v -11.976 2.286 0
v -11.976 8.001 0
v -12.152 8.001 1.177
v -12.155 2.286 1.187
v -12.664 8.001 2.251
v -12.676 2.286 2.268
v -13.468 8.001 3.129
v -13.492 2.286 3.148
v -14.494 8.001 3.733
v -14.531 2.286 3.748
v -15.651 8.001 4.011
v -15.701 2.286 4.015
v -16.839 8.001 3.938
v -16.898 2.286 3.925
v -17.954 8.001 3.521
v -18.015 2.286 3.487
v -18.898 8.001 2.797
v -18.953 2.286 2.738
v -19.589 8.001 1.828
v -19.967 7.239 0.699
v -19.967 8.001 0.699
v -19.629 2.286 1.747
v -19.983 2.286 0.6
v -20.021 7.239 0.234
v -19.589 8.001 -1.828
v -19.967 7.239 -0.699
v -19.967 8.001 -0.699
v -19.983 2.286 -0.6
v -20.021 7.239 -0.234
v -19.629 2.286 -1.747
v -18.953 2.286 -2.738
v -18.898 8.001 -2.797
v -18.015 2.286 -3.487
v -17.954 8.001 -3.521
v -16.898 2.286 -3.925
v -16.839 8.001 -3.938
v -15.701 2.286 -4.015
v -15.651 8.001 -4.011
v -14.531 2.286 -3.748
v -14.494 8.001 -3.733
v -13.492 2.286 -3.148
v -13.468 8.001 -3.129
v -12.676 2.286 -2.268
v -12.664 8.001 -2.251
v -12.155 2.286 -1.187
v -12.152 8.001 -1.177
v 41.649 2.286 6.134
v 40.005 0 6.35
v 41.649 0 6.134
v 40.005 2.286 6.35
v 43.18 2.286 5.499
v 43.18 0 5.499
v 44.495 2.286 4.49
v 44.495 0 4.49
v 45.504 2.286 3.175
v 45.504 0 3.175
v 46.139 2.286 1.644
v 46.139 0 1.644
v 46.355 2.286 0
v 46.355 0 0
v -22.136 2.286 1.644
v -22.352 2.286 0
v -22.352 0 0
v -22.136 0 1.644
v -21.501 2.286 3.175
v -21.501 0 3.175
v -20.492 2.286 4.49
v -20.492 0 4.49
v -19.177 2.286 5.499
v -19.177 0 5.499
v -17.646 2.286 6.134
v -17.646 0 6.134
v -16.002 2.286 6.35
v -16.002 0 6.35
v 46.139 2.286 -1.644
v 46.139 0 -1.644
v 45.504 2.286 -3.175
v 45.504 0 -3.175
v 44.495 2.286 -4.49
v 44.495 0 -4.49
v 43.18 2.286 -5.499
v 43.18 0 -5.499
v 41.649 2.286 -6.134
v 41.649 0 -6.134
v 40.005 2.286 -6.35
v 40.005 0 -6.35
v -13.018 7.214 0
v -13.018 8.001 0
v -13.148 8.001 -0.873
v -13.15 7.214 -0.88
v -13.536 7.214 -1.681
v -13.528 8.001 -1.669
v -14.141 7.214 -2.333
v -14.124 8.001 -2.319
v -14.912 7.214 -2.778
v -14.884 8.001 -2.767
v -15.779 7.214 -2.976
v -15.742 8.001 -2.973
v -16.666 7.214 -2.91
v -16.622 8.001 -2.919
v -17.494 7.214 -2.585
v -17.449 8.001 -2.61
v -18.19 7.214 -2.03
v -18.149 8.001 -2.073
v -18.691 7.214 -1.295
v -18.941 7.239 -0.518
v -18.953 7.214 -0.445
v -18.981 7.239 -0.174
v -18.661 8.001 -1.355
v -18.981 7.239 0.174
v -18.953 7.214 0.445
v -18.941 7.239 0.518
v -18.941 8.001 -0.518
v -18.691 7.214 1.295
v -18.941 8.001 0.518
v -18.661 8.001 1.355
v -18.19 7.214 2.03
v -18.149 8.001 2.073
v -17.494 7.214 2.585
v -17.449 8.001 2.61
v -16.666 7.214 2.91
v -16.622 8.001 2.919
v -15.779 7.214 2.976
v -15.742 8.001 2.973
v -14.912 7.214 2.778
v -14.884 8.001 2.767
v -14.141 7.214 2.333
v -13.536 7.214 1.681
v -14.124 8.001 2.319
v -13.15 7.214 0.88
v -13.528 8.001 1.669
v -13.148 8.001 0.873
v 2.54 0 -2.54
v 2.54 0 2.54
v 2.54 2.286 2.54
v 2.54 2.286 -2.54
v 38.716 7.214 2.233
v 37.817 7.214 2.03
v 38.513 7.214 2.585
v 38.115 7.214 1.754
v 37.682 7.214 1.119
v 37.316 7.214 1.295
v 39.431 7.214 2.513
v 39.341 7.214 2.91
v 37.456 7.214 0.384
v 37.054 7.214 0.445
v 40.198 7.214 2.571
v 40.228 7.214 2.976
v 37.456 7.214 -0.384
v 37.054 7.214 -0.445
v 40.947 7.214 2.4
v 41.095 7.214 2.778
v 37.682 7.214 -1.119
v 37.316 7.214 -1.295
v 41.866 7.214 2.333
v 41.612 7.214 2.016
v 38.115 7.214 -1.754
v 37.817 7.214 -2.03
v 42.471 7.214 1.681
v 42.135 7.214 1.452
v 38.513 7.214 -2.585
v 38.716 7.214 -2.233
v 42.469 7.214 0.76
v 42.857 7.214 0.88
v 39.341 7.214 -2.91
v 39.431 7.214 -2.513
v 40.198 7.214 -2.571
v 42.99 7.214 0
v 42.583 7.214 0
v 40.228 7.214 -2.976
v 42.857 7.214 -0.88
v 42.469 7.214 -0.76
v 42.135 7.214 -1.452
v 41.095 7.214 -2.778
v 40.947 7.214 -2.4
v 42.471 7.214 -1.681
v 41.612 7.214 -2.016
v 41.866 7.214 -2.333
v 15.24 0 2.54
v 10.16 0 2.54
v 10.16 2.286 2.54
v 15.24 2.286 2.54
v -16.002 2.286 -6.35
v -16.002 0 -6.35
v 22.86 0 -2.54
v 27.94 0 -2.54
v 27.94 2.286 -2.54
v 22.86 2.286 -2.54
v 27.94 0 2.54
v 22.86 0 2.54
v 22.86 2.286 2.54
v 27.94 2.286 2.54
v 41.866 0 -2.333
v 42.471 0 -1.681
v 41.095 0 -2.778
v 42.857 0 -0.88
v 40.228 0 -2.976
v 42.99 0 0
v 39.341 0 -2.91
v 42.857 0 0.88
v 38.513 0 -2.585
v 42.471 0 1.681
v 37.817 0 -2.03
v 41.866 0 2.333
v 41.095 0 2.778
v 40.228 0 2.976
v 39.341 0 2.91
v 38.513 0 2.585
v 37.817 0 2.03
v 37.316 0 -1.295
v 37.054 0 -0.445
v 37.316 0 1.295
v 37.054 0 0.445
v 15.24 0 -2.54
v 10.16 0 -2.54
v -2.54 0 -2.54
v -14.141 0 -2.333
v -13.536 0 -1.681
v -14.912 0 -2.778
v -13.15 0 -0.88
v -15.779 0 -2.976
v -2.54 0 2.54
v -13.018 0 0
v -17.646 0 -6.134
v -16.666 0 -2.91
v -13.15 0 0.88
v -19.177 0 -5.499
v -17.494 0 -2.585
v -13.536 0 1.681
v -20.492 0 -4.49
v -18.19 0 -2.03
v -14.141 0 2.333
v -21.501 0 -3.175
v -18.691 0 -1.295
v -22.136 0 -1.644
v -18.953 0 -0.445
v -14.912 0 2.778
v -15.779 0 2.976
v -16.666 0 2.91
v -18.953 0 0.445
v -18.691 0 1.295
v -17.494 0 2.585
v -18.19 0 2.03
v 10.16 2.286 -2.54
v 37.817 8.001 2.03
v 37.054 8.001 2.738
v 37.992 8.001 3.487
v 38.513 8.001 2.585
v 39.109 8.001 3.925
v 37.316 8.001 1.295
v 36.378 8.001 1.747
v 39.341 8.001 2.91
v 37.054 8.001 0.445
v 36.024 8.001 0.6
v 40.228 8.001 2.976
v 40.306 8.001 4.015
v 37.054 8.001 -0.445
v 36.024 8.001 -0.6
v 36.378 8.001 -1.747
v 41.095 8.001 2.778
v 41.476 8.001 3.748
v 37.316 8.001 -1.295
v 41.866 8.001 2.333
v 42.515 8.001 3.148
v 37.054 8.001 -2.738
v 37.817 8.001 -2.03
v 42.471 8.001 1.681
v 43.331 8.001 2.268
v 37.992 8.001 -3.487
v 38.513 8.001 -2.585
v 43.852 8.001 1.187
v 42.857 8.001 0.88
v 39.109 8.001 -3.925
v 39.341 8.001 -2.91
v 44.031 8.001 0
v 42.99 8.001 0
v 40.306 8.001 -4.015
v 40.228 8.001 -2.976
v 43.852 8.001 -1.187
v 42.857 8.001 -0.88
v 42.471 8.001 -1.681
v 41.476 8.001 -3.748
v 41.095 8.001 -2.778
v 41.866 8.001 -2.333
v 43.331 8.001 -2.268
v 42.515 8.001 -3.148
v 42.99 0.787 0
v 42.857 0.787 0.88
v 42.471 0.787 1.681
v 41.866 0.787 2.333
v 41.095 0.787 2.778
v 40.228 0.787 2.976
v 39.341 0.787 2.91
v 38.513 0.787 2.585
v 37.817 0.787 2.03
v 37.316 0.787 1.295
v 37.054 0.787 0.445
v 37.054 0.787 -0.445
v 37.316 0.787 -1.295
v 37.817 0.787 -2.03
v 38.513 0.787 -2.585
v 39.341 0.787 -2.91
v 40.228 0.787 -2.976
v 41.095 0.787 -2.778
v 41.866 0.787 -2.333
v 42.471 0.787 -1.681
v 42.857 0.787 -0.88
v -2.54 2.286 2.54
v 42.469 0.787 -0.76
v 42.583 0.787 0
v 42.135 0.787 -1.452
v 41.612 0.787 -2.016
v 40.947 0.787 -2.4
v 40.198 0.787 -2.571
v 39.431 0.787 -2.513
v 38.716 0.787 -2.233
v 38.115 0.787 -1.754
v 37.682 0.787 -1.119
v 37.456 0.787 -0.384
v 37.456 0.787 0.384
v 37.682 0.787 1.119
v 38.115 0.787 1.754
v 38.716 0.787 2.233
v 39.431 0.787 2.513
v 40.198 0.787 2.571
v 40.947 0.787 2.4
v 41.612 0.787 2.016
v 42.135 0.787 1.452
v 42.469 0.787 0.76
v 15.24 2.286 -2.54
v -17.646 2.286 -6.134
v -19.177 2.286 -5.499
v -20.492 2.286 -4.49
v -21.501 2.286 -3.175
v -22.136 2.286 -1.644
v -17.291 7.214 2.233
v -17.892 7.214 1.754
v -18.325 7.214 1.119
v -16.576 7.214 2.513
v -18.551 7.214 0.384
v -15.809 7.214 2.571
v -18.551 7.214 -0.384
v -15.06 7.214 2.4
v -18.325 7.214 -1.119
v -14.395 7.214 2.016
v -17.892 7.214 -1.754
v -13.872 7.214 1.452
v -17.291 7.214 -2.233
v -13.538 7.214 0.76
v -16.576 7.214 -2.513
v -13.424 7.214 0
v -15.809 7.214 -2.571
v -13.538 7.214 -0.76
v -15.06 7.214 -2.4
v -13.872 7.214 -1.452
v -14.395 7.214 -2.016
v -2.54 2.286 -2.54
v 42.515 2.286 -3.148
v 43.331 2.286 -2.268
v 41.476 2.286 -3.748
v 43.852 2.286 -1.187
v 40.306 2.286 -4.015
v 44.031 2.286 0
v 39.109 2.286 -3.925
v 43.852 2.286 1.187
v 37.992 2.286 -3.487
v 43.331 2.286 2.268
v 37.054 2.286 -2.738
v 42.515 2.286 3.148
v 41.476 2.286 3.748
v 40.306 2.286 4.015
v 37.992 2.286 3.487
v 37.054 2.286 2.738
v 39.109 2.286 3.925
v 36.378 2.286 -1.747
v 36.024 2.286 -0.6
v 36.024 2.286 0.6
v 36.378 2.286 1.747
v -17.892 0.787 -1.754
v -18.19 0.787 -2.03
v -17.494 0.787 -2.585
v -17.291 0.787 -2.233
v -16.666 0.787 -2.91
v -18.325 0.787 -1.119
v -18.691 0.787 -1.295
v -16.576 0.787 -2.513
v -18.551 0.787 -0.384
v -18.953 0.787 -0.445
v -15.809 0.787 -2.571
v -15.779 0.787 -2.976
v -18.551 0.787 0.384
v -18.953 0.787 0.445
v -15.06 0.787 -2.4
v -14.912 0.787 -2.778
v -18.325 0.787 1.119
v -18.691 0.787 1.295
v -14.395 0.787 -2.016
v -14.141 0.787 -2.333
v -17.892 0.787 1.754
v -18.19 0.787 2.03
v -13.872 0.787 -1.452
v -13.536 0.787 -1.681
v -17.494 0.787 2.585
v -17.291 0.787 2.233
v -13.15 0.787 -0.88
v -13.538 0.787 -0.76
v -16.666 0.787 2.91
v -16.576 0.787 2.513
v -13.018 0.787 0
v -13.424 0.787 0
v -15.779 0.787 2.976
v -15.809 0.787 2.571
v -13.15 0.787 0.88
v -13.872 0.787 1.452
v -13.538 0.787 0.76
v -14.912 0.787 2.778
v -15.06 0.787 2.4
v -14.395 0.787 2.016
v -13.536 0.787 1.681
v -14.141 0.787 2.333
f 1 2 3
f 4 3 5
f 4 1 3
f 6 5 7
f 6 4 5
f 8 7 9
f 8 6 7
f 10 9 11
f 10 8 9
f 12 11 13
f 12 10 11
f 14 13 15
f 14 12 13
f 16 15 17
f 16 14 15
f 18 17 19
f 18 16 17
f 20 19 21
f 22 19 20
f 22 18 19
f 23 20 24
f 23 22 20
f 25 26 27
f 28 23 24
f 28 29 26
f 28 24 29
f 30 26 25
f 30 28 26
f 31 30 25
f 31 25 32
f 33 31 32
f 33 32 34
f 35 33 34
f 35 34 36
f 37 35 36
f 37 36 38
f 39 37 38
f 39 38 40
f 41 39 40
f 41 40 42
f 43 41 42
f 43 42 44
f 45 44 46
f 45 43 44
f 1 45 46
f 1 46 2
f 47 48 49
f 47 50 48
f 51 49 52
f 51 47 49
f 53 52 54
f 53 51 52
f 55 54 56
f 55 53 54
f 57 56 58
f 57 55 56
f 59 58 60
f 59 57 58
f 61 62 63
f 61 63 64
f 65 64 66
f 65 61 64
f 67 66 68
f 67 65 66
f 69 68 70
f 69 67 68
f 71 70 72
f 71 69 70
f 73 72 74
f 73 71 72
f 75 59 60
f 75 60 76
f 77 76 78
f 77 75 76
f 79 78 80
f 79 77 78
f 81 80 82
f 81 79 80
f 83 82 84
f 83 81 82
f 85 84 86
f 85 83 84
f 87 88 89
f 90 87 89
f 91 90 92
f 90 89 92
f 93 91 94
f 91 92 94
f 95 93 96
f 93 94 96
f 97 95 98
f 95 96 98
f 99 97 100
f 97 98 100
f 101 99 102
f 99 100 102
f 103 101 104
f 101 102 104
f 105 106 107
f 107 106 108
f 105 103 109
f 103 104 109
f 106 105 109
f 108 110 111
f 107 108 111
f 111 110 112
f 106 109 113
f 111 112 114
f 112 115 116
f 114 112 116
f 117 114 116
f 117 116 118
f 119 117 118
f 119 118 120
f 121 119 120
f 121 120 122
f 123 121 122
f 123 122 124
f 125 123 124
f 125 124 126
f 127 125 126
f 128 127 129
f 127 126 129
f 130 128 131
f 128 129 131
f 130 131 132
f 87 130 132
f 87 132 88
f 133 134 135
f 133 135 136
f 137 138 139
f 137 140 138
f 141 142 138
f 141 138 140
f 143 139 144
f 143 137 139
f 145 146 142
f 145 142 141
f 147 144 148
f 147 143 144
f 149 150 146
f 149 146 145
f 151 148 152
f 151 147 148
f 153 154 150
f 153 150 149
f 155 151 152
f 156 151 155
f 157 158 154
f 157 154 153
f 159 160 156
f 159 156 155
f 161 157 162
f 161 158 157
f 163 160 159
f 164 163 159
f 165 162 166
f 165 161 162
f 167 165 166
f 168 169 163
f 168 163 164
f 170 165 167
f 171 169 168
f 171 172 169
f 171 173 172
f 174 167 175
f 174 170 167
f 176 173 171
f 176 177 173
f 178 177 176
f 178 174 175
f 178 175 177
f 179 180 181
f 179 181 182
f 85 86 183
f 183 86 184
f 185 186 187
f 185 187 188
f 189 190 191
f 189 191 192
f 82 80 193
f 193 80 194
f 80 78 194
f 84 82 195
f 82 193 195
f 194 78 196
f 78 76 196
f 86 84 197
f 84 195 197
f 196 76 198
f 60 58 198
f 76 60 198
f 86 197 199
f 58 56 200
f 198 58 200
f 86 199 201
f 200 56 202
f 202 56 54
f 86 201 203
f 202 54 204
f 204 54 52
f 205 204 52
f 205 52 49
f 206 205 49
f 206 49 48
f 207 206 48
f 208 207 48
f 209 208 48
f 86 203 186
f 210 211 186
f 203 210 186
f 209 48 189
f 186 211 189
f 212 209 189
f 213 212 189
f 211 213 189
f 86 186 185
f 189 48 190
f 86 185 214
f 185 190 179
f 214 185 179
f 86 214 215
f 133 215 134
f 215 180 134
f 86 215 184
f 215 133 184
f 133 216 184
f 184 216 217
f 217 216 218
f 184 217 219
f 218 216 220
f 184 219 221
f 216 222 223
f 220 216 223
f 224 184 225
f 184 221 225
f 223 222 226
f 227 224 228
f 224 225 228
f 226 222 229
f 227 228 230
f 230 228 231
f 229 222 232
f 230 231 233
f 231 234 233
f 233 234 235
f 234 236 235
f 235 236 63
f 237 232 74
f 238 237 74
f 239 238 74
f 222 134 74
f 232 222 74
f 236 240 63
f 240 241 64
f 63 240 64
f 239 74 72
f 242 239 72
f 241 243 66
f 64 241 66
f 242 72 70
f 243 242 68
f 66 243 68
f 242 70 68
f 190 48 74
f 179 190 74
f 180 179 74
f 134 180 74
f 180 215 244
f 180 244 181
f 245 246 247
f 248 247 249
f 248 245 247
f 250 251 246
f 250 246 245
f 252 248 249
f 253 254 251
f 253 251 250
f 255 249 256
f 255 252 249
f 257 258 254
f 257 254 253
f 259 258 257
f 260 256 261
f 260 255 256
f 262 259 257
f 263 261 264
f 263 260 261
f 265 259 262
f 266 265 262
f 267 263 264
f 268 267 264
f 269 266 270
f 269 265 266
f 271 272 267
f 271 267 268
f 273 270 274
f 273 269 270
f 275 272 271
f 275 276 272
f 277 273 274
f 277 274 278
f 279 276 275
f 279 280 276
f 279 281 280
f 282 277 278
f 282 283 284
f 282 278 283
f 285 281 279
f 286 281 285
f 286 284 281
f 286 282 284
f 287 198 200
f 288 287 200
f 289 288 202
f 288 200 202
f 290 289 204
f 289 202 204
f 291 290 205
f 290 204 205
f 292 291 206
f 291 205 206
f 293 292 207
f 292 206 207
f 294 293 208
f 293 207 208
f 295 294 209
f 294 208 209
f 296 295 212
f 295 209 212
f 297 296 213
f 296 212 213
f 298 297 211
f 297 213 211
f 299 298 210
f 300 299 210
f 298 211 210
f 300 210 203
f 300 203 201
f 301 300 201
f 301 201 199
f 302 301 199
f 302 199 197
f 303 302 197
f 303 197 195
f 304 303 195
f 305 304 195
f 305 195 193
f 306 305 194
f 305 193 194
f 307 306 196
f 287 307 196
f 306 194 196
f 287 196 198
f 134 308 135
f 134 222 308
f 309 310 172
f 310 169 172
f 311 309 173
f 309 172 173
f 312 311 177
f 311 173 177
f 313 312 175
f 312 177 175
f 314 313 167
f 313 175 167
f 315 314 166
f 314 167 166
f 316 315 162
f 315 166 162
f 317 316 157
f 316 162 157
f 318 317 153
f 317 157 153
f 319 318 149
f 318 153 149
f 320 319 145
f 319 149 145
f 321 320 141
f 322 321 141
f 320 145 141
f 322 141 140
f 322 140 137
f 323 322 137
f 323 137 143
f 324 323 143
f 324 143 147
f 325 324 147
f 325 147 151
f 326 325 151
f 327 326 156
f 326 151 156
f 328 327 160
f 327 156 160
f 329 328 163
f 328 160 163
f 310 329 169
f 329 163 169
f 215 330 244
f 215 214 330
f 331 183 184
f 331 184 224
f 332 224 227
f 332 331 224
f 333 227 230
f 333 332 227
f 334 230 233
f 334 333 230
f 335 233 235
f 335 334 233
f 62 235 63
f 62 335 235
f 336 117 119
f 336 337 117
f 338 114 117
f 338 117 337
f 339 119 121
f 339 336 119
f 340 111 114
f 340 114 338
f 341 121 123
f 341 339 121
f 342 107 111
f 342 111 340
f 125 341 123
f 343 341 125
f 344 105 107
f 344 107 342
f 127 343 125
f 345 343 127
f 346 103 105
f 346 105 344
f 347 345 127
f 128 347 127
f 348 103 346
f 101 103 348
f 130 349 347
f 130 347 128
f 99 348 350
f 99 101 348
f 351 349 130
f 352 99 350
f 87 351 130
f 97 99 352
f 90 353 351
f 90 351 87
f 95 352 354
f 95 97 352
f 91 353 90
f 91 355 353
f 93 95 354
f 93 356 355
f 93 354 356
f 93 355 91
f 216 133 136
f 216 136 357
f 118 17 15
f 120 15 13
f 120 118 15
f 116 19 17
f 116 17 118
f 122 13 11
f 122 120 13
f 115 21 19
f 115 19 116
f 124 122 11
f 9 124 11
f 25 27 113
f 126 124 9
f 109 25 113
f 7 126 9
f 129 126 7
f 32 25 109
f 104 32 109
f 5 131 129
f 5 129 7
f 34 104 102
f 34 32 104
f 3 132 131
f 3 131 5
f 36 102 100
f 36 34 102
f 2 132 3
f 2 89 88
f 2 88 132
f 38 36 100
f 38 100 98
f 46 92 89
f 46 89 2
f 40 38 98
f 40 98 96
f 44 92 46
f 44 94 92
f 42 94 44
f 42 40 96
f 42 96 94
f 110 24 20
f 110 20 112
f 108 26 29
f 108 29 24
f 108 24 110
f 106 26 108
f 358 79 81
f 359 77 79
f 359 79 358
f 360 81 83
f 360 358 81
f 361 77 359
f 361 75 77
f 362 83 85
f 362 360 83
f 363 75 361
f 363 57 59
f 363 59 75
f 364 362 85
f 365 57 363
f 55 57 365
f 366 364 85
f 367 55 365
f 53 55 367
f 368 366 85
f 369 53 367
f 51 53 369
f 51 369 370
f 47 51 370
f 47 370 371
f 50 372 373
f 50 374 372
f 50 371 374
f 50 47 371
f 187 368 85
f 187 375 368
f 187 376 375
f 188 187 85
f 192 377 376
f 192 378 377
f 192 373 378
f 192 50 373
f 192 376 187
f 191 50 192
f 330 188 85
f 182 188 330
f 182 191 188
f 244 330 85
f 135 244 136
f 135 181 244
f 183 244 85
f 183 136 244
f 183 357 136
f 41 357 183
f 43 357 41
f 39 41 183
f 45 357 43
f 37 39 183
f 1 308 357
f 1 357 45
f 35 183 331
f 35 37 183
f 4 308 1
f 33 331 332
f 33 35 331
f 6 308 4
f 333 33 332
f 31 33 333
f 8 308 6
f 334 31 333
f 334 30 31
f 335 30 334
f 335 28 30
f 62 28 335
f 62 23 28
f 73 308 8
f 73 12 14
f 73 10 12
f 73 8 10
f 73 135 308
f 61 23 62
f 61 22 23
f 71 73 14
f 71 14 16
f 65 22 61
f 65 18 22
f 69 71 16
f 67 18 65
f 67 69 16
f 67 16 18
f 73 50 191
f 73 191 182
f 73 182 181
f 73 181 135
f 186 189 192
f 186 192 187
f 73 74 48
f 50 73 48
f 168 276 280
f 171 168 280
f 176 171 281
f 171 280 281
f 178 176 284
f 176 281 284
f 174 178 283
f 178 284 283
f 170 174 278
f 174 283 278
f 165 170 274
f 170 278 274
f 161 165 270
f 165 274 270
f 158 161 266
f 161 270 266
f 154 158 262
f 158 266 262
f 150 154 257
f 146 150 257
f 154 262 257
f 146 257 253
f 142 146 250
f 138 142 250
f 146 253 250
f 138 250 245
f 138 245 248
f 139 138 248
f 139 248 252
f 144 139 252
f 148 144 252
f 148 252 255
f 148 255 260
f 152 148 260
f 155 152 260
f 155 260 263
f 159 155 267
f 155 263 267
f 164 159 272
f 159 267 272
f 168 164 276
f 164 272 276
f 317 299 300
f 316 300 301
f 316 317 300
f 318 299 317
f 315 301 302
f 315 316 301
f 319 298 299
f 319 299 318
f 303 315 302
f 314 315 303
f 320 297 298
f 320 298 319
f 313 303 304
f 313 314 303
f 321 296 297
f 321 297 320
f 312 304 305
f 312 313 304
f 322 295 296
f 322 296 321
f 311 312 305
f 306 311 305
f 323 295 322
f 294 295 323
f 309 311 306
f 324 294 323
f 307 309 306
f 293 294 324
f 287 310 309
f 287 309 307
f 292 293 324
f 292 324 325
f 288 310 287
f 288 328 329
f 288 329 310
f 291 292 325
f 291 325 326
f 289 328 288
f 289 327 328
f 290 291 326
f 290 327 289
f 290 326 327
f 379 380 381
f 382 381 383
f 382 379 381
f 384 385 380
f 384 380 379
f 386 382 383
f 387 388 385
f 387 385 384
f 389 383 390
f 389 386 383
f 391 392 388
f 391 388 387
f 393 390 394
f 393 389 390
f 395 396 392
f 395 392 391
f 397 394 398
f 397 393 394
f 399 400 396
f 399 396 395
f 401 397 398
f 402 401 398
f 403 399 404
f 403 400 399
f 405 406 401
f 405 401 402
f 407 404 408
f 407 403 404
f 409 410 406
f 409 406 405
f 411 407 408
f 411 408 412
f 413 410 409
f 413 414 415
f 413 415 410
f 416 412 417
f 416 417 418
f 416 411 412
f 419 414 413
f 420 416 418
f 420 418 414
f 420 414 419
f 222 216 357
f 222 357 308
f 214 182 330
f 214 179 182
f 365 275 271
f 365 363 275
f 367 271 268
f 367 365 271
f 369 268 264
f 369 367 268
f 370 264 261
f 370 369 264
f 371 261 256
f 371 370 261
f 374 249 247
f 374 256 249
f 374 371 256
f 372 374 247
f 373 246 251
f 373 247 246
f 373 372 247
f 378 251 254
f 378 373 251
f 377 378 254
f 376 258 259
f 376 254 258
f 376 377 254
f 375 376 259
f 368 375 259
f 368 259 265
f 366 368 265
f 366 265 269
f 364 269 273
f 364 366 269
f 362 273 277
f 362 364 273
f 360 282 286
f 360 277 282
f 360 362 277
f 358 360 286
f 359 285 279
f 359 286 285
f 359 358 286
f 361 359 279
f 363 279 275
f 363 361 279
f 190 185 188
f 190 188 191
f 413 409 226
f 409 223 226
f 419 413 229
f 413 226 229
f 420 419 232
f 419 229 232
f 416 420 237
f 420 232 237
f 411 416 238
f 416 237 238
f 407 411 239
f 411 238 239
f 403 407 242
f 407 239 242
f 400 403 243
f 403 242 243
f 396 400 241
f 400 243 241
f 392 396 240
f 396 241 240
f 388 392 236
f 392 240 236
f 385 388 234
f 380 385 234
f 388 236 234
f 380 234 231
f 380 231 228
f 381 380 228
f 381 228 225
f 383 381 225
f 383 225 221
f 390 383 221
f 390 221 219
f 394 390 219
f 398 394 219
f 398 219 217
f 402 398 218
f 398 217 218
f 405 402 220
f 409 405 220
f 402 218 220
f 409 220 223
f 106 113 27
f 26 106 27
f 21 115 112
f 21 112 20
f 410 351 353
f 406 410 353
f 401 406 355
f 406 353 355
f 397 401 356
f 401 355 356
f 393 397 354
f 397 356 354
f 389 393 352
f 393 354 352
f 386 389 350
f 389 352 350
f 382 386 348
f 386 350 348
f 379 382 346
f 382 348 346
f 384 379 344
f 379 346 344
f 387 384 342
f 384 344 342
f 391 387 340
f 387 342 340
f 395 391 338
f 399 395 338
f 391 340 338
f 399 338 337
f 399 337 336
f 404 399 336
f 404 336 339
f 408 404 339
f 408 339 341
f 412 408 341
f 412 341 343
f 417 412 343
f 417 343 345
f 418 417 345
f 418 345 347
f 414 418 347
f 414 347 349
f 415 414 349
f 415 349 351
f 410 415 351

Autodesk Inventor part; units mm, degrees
ref_plane "YZ Plane" through (0, 0, 0) normal (1, 0, 0) x (0, 1, 0)
ref_plane "XZ Plane" through (0, 0, 0) normal (0, 1, 0) x (-1, 0, 0)
ref_plane "XY Plane" through (0, 0, 0) normal (0, 0, 1) x (1, 0, 0)
sketch "Sketch1" plane through (0, 0, 0) normal (0, 1, 0) x (-1, 0, 0)
  line L0 (22.352, 6.35) -> (-46.355, 6.35)
  line L1 (-46.355, 6.35) -> (-46.355, -6.35)
  line L2 (-46.355, -6.35) -> (22.352, -6.35)
  line L3 (22.352, -6.35) -> (22.352, 6.35)
  line L4 (-2.54, -2.54) -> (2.54, -2.54)
  line L5 (2.54, -2.54) -> (2.54, 2.54)
  line L6 (2.54, 2.54) -> (-2.54, 2.54)
  line L7 (-2.54, 2.54) -> (-2.54, -2.54)
  line L8 (-2.54, -2.54) -> (2.54, 2.54) construction
  line L9 (2.54, -2.54) -> (-2.54, 2.54) construction
  line L10 (-10.16, 2.54) -> (-15.24, 2.54)
  line L11 (-15.24, 2.54) -> (-15.24, -2.54)
  line L12 (-15.24, -2.54) -> (-10.16, -2.54)
  line L13 (-10.16, -2.54) -> (-10.16, 2.54)
  line L14 (-10.16, 2.54) -> (-15.24, -2.54) construction
  line L15 (-15.24, 2.54) -> (-10.16, -2.54) construction
  line L16 (-22.86, 2.54) -> (-27.94, 2.54)
  line L17 (-27.94, 2.54) -> (-27.94, -2.54)
  line L18 (-27.94, -2.54) -> (-22.86, -2.54)
  line L19 (-22.86, -2.54) -> (-22.86, 2.54)
  line L20 (-22.86, 2.54) -> (-27.94, -2.54) construction
  line L21 (-27.94, 2.54) -> (-22.86, -2.54) construction
  point P0 (0, 0)
  point P1 (-12.7, 0)
  point P2 (-25.4, 0)
  dimension "d0" = 68.707
  dimension "d1" = 12.7
  dimension "d2" = 5.08
  dimension "d3" = 5.08
  dimension "d4" = 5.08
  dimension "d5" = 5.08
  dimension "d6" = 12.7
  dimension "d7" = 12.7
  dimension "d8" = 6.35
  dimension "d9" = 22.352
  dimension "d37" = 5.08
  dimension "d38" = 5.08
extrude "Extrusion1" add sketch "Sketch1" along normal blind 2.286
sketch "Sketch2" plane through (0, 2.286, 0) normal (0, 1, 0) x (1, 0, 0)
  line L0 (-22.352, 6.35) -> (-22.352, -6.35) projected
  circle A0 centre (-16.002, 0) radius 4.0259
  point P0 (0, 0)
  dimension "d12" = 6.35
  dimension "d13" = 8.0518
extrude "Extrusion2" add sketch "Sketch2" along normal blind 5.715
sketch "Sketch3" plane through (-16.002, 8.001, 0) normal (0, 1, 0) x (1, 0, 0)
  circle A0 centre (0, 0) radius 2.9845
  point P0 (16.002, 0)
  dimension "d16" = 5.969
extrude "Extrusion3" cut sketch "Sketch3" against normal blind 0.7874
sketch "Sketch4" plane through (0, 0, 0) normal (0, -1, 0) x (1, 0, 0)
  circle A0 centre (-16.002, 0) radius 2.9845 projected
  circle A1 centre (-16.002, 0) radius 2.9845
  point P0 (0, 0)
  dimension "d39" = 5.969
extrude "Extrusion4" cut sketch "Sketch4" against normal blind 0.7874
sketch "Sketch5" plane through (-16.002, 7.2136, 0) normal (0, 1, 0) x (1, 0, 0)
  circle A0 centre (0, 0) radius 2.5781
  point P0 (16.002, 0)
  dimension "d21" = 5.1562
extrude "Extrusion5" cut sketch "Sketch5" against normal through all
sketch "Sketch6" plane through (0, 2.286, 0) normal (0, 1, 0) x (1, 0, 0)
  line L0 (46.355, -6.35) -> (46.355, 6.35) projected
  circle A0 centre (40.005, 0) radius 4.0259
  point P0 (0, 0)
  dimension "d24" = 6.35
  dimension "d25" = 8.0518
extrude "Extrusion6" add sketch "Sketch6" along normal blind 5.715
sketch "Sketch7" plane through (40.005, 8.001, 0) normal (0, 1, 0) x (1, 0, 0)
  circle A0 centre (0, 0) radius 2.9845
  point P0 (-40.005, 0)
  dimension "d28" = 5.969
extrude "Extrusion7" cut sketch "Sketch7" against normal blind 0.7874
sketch "Sketch8" plane through (0, 0, 0) normal (0, -1, 0) x (1, 0, 0)
  circle A0 centre (40.005, 0) radius 2.9845 projected
  circle A1 centre (40.005, 0) radius 2.9845
  point P0 (0, 0)
  dimension "d40" = 5.969
extrude "Extrusion8" cut sketch "Sketch8" against normal blind 0.7874
sketch "Sketch9" plane through (40.005, 7.2136, 0) normal (0, 1, 0) x (1, 0, 0)
  circle A0 centre (0, 0) radius 2.5781
  point P0 (-40.005, 0)
  dimension "d33" = 5.1562
extrude "Extrusion9" cut sketch "Sketch9" against normal through all
fillet "Fillet1" radius 6.35 4 edges at (46.355, 1.143, 6.35) (46.355, 1.143, -6.35) (-22.352, 1.143, 6.35) (-22.352, 1.143, -6.35)
sketch "Sketch12" plane through (-16.002, 8.001, 0) normal (0, 1, 0) x (1, 0, 0)
  circle A0 centre (0, 0) radius 4.0259 projected
  line L0 (0, 0) -> (4.0259, 0) construction
  line L1 (0, 0) -> (4.0259, 0) construction
  circle A1 centre (0, 0) radius 2.9845 projected
  line L2 (-2.9392, 0.5183) -> (-3.9647, 0.6991)
  line L3 (-2.9392, -0.5183) -> (-3.9647, -0.6991)
  arc A2 (-2.9392, 0.5183) -> (-2.9392, -0.5183) centre (0, 0) ccw
  arc A3 (-3.9647, 0.6991) -> (-3.9647, -0.6991) centre (0, 0) ccw
  point P0 (16.002, 0)
  point P1 (-2.9392, 0.5183)
extrude "Extrusion11" cut sketch "Sketch12" against normal blind 0.762 contours L2 A1 L3 A0 picked at (-3.6725, 0.0578)
properties part number "VexLegoMountThick"
